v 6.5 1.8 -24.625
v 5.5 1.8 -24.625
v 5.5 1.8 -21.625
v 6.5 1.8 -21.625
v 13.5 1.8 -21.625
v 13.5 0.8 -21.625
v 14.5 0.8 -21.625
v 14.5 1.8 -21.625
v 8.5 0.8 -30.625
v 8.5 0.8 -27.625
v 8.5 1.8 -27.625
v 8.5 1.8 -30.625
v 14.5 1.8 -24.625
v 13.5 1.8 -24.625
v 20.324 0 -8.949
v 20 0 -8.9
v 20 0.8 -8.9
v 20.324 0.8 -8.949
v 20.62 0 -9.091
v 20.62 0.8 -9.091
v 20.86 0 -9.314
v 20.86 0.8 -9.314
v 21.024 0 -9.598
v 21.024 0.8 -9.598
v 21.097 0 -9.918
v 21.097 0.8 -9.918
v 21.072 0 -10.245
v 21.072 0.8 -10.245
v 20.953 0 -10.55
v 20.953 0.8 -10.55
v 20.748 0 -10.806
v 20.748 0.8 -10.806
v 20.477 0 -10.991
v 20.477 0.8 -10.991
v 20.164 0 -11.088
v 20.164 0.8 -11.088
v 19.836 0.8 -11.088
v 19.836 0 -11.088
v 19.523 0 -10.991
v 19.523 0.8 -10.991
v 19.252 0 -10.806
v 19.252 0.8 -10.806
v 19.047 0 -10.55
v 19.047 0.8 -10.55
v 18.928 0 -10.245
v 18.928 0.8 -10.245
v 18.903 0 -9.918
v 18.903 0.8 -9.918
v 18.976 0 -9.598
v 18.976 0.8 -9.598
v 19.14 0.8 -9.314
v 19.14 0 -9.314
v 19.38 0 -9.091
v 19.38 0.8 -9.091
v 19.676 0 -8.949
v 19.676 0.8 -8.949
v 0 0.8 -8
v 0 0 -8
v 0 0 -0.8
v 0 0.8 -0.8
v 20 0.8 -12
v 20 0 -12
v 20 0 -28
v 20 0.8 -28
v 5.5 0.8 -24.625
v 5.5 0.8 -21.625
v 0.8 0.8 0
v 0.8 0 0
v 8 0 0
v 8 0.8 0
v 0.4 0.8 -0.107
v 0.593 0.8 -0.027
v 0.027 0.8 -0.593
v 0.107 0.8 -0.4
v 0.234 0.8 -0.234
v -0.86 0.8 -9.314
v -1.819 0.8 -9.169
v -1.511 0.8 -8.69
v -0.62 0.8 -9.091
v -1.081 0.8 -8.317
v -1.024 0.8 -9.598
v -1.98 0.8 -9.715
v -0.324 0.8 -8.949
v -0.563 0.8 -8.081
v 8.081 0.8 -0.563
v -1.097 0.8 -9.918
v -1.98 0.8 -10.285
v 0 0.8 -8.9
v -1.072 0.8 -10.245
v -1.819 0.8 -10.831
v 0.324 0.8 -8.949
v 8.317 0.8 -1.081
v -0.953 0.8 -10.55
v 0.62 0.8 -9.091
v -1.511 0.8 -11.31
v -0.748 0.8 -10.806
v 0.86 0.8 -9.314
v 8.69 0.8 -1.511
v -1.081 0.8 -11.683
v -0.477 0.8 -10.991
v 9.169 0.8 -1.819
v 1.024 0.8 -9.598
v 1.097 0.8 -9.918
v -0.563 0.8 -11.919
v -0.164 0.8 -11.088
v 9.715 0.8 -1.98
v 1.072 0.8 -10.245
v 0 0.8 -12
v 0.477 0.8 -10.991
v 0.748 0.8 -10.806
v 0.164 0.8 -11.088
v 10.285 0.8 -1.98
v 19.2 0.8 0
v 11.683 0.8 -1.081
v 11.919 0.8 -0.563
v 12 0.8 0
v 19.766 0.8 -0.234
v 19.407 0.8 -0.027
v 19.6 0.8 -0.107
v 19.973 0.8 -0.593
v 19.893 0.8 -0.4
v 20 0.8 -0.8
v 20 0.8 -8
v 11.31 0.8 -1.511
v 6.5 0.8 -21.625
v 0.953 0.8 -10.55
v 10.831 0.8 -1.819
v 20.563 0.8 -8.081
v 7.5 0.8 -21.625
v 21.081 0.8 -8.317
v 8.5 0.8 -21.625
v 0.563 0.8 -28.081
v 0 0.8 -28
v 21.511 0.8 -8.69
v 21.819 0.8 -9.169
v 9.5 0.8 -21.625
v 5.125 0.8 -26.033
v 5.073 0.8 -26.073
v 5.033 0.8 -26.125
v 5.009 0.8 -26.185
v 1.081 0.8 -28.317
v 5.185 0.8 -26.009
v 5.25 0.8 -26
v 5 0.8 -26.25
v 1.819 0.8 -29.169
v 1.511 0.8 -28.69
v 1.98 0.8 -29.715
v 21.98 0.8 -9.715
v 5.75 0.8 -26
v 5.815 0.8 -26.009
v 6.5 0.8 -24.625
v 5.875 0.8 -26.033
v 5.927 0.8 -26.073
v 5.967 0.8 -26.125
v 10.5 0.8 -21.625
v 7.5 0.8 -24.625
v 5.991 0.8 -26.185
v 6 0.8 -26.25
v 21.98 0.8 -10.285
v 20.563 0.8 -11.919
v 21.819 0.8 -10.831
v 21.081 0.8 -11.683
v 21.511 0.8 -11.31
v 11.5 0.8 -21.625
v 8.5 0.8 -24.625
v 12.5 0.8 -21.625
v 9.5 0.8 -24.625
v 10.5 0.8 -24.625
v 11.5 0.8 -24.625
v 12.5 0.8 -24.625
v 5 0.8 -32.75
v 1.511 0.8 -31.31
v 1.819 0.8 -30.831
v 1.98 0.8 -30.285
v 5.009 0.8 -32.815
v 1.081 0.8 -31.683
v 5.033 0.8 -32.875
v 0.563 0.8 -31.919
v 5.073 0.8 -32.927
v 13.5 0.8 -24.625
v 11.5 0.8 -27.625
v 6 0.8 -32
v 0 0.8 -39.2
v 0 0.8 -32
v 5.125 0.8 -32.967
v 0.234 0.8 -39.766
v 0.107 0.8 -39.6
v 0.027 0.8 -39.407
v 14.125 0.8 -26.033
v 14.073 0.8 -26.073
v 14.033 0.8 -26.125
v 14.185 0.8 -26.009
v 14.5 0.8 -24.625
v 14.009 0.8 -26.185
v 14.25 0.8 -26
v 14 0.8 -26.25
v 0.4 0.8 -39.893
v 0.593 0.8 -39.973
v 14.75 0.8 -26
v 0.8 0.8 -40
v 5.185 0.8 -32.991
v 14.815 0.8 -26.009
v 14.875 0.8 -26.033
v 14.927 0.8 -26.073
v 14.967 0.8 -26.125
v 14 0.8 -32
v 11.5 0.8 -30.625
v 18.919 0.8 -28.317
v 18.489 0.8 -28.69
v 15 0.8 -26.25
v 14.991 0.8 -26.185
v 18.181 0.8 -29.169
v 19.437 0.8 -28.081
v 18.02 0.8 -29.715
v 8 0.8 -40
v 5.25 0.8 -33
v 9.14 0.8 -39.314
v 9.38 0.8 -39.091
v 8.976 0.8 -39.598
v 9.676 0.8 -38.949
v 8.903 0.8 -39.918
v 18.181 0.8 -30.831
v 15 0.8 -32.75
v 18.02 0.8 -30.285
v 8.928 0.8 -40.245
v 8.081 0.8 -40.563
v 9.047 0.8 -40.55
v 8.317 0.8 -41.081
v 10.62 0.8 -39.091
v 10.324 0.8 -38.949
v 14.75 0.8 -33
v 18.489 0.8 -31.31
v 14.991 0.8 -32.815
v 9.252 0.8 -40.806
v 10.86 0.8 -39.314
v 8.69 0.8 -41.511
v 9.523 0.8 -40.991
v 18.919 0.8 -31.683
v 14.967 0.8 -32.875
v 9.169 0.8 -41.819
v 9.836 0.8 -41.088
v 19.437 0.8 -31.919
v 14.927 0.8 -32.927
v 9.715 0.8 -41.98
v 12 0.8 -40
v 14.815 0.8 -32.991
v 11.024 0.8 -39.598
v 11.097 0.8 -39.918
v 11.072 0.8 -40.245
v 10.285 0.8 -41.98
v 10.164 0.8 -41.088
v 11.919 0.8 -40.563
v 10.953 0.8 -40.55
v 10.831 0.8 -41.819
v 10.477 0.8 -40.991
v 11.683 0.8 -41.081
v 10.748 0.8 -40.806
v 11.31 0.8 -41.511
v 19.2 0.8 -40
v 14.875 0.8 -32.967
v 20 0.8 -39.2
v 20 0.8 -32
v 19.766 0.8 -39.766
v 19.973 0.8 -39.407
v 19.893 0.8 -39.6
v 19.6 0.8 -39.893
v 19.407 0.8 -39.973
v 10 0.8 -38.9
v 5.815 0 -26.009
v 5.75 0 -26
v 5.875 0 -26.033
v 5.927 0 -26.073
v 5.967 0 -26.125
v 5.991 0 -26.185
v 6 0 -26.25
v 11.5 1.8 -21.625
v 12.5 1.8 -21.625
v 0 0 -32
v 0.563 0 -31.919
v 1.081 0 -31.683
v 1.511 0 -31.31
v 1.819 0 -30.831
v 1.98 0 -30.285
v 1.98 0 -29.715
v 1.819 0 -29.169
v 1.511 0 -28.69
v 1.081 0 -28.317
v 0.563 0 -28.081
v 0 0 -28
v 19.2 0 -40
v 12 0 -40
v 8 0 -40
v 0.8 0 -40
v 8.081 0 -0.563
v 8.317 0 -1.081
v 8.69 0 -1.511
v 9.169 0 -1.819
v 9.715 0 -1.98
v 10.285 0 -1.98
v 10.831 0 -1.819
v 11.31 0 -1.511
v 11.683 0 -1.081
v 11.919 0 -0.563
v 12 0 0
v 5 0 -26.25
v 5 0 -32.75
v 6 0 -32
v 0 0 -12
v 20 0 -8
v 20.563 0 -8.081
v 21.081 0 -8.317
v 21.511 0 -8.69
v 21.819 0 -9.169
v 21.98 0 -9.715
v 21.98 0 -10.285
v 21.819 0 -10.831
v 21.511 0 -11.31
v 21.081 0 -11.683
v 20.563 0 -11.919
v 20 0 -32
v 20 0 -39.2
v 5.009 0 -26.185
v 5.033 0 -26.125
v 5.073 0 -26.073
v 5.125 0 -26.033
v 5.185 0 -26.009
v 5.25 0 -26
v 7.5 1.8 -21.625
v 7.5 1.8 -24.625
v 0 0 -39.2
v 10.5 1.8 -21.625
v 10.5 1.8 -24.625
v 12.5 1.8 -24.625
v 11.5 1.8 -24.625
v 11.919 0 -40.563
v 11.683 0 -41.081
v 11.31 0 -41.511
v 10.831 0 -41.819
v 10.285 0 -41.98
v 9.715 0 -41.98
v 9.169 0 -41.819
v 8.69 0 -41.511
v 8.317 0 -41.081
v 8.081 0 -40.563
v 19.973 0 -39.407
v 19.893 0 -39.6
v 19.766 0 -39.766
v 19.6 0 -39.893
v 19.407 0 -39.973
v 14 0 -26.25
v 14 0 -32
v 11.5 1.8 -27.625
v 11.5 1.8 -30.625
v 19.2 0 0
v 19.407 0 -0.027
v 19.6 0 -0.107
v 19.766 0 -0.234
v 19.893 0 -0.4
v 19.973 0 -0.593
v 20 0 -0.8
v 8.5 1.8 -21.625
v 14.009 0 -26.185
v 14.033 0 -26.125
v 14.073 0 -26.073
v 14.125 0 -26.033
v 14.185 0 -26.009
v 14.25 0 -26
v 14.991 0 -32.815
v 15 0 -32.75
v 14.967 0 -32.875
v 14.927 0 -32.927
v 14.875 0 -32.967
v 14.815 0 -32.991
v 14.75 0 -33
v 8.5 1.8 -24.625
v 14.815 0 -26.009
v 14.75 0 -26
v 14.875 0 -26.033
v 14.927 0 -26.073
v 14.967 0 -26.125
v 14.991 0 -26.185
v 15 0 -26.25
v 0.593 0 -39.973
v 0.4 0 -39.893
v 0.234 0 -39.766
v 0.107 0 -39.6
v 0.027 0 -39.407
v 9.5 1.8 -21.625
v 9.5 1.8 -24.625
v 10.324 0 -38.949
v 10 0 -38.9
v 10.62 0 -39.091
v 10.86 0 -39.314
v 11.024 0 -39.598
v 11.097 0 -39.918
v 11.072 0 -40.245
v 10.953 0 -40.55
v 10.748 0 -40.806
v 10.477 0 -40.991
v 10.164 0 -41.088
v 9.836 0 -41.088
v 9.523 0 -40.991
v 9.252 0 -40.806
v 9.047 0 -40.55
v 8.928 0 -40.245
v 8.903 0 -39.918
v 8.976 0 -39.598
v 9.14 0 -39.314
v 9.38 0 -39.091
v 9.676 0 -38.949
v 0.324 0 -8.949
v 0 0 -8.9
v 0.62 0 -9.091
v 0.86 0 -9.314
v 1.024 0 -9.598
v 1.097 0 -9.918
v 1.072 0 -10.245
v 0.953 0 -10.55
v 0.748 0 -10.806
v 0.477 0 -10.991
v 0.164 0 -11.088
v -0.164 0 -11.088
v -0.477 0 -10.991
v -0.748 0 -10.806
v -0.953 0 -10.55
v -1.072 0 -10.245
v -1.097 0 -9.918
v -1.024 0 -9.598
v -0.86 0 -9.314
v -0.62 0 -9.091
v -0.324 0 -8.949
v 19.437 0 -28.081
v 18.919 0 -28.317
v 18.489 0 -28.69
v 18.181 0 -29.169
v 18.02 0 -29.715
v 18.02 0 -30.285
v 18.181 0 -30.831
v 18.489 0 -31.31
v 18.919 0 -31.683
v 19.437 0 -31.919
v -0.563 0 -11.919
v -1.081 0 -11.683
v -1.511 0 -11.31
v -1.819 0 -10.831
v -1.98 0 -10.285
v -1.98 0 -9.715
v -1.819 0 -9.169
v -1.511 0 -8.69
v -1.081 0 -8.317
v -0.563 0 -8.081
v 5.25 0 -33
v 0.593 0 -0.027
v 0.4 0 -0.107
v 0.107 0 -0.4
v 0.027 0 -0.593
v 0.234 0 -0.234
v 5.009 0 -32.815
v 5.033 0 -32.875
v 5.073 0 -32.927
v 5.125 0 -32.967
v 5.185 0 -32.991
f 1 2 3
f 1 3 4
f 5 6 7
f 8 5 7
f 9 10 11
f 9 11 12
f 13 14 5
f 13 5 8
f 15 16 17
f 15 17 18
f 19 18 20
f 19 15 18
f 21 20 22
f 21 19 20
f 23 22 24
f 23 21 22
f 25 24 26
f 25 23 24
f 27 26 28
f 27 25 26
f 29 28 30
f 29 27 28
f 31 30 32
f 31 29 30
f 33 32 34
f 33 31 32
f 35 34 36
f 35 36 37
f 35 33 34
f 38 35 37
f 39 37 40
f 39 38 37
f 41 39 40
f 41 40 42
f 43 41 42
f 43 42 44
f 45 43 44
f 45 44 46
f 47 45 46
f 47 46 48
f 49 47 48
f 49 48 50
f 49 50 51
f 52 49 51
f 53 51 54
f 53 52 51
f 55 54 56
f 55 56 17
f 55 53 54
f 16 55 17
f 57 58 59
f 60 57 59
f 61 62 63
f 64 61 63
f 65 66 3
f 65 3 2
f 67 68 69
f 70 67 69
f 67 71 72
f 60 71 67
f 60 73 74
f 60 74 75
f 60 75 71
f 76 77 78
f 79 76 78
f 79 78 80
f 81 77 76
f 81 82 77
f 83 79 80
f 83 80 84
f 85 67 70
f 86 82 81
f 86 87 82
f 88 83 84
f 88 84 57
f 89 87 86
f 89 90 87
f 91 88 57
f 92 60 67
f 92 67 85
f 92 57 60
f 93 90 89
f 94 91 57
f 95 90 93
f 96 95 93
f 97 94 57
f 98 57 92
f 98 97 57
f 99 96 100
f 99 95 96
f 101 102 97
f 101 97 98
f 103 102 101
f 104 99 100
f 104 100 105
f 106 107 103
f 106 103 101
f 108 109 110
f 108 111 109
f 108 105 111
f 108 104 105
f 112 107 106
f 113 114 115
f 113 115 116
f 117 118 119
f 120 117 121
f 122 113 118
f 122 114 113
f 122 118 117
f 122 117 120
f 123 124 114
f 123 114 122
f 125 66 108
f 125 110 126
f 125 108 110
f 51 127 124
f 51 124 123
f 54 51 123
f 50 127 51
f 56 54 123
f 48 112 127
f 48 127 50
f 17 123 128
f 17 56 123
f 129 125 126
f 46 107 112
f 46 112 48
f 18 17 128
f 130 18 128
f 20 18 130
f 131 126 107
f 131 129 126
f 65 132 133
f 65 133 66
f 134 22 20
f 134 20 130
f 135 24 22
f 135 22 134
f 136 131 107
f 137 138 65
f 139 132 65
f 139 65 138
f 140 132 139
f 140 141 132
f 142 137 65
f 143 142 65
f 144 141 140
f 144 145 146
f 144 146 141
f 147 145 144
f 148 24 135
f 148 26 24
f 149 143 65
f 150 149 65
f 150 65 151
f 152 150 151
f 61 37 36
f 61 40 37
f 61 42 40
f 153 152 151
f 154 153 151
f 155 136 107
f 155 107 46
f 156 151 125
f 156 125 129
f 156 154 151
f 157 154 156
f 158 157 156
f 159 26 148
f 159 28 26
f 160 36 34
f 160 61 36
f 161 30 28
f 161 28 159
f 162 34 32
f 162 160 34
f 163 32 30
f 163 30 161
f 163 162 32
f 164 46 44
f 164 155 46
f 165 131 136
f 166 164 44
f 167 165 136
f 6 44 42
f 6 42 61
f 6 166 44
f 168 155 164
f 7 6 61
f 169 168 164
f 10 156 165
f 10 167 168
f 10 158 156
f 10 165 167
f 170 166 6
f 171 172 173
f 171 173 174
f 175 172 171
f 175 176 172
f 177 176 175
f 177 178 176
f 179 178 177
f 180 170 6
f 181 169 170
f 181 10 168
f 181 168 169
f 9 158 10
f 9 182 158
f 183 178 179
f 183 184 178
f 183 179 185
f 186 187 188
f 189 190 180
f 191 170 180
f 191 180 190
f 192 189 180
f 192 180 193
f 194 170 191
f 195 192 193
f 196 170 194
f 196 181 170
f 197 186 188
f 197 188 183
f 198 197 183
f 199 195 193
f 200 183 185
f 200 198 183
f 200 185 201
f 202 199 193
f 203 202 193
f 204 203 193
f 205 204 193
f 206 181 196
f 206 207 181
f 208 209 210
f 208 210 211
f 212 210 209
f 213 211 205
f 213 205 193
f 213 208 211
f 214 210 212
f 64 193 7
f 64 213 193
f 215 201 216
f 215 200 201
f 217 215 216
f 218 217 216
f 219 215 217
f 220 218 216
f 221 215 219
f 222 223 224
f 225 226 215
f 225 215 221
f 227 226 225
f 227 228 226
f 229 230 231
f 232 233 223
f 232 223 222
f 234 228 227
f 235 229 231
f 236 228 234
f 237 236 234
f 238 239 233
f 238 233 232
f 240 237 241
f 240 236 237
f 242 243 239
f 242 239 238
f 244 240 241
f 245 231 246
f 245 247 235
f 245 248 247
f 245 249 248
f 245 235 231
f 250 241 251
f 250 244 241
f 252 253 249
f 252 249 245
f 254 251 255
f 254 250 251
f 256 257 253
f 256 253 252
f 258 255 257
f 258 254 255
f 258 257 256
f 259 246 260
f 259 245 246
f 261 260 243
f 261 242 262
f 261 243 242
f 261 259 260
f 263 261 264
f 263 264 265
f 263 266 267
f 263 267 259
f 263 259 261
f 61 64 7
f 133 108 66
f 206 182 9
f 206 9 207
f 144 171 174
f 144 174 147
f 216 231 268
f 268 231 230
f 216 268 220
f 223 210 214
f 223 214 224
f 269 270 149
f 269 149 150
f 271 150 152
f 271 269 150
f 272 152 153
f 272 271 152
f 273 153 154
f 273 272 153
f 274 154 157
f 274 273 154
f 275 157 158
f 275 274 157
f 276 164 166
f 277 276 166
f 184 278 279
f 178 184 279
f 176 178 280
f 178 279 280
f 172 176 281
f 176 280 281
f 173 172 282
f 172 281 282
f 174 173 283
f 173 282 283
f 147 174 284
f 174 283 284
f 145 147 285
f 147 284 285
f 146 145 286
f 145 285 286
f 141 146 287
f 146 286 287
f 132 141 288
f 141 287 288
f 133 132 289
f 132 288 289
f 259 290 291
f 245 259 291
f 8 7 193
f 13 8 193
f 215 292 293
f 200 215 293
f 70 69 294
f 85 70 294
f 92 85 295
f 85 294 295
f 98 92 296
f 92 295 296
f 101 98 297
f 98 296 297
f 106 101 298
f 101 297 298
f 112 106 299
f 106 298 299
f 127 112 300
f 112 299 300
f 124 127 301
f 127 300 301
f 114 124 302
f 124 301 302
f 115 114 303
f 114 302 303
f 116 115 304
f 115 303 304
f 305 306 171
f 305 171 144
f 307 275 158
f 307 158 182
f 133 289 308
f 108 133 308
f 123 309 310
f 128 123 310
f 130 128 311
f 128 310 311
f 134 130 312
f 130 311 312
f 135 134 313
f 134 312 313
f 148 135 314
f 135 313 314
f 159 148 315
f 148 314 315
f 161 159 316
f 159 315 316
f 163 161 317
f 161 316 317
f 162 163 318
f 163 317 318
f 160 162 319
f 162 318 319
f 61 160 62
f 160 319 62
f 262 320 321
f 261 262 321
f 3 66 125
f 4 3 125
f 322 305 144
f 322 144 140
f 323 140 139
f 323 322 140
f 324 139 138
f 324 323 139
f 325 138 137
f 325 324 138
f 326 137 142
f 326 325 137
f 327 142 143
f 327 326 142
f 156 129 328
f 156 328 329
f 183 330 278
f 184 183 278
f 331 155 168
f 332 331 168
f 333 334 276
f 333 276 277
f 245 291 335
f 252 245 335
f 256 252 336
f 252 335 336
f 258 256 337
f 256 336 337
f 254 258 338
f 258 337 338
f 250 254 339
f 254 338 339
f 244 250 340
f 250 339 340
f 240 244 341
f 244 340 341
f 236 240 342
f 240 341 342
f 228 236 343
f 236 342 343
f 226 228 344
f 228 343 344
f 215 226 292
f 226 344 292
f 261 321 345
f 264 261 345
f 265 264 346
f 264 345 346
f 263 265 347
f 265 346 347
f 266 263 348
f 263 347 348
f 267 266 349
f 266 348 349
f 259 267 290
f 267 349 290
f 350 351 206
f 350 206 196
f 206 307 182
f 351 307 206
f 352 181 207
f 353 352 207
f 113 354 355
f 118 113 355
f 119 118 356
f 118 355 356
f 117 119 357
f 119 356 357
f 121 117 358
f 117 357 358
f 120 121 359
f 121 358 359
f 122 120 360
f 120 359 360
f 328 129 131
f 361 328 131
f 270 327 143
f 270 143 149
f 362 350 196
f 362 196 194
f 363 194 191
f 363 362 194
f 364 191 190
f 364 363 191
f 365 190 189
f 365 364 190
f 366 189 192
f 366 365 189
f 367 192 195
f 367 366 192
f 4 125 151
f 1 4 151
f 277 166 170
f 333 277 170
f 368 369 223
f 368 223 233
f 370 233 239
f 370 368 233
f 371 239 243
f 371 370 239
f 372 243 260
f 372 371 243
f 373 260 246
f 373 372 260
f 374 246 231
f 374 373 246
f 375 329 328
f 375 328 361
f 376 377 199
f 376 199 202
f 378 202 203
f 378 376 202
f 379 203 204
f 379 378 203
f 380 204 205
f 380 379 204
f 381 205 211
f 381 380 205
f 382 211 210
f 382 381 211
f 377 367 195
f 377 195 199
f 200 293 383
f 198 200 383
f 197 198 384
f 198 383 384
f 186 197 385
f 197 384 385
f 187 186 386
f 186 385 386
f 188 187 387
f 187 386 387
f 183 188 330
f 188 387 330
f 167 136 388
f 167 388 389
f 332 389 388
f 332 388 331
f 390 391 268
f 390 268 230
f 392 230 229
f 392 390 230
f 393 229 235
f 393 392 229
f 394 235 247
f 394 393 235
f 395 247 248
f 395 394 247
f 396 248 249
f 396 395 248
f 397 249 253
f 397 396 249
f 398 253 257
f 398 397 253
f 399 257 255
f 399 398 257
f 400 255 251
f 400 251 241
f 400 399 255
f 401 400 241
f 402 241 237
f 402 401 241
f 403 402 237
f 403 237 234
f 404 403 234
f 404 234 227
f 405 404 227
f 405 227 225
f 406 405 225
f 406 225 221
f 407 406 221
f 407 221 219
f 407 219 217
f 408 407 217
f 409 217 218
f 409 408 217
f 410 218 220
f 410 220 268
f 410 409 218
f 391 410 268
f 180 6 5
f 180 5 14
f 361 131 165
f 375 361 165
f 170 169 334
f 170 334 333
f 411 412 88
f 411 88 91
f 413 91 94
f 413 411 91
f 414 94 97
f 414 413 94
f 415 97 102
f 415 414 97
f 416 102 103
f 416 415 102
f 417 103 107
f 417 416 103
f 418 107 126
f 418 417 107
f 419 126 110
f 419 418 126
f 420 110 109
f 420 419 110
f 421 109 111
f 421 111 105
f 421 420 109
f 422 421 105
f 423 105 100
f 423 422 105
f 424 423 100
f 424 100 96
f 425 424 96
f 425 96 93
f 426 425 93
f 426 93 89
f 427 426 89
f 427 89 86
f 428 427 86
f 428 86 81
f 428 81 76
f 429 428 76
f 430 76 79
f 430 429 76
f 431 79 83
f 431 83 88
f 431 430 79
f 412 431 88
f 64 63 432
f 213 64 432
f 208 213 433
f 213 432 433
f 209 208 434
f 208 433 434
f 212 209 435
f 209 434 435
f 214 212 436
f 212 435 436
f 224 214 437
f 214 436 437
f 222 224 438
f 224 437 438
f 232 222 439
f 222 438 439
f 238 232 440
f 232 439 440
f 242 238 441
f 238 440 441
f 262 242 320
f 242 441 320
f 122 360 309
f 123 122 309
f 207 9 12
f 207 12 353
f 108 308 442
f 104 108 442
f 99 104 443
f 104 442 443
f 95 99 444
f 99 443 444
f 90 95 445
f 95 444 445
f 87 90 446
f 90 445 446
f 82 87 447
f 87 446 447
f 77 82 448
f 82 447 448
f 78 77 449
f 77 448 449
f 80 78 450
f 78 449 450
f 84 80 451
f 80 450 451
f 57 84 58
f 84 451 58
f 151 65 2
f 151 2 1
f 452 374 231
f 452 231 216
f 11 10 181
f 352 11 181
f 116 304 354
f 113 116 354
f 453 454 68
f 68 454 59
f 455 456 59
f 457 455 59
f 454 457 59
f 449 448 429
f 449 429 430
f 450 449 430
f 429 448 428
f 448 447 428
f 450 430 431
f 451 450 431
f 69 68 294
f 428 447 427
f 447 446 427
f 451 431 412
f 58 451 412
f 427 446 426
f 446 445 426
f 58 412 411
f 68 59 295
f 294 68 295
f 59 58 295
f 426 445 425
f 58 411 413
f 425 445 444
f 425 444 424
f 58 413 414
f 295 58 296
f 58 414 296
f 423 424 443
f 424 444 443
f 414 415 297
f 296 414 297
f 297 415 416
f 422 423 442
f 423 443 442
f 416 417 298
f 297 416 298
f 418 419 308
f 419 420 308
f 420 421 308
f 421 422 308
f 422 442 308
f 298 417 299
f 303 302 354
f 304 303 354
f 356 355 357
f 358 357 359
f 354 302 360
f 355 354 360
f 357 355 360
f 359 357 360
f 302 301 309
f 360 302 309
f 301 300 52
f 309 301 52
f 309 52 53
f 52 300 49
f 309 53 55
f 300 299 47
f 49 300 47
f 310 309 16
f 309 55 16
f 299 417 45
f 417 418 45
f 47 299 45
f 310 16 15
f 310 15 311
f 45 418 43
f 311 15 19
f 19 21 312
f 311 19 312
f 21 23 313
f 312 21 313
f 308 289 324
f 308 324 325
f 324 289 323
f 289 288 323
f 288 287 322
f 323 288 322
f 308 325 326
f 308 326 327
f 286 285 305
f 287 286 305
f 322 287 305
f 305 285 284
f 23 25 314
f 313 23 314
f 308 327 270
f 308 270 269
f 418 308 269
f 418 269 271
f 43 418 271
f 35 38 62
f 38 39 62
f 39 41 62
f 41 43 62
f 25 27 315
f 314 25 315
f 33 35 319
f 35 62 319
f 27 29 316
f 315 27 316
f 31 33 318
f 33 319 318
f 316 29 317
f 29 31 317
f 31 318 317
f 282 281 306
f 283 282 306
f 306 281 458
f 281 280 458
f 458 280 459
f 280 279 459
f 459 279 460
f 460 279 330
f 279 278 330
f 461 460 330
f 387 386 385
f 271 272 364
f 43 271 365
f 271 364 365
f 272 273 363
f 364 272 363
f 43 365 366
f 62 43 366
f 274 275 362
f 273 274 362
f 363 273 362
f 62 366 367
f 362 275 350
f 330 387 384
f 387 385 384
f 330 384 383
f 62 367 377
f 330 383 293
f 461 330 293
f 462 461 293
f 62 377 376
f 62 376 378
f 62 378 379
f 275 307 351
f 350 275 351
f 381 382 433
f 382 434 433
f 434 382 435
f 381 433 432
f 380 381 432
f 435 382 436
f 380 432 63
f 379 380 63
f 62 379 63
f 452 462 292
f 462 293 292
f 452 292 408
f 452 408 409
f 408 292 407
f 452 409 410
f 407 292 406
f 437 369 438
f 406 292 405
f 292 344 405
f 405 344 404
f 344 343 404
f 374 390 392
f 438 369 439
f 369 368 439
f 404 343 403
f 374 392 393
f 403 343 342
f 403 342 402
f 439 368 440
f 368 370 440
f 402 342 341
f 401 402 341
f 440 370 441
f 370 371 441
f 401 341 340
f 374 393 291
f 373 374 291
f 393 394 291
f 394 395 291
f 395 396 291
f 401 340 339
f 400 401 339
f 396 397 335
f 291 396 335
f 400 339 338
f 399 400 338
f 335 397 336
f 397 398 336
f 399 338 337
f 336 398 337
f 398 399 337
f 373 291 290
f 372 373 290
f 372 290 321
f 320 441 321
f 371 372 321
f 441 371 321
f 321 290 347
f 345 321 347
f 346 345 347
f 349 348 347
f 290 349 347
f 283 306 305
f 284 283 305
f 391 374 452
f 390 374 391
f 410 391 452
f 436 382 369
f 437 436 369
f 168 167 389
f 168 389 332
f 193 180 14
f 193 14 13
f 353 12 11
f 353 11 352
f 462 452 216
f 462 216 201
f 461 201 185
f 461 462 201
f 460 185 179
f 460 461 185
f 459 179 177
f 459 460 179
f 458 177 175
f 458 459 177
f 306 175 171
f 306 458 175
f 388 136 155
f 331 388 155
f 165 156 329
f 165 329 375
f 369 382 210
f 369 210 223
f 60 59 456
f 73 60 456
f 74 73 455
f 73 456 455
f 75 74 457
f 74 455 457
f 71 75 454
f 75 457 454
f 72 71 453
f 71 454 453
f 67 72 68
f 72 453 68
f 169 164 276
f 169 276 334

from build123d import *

# Parameters (mm, degrees)
SKETCH1_R        = 1.1
BOARD_DEPTH      = 0.8
U_CUT_DEPTH      = 48.419827077
U_CUT_DEPTH_BACK = 48.419827077
SKETCH3_W        = 1
SKETCH3_H        = 3
SKETCH3_W_2      = 3
SMDS_DEPTH       = 1


with BuildPart() as part:
    # Sketch1 → Board (new body)
    with BuildSketch(Plane(origin=(0, 0, 0), x_dir=(1, 0, 0), z_dir=(0, 1, 0))):
        with BuildLine():
            Line((0.8, 0), (8, 0))
            ThreePointArc((8, 0), (10, 2), (12, 0))
            Line((12, 0), (19.2, 0))
            ThreePointArc((19.2, 0), (19.765685425, 0.234314575), (20, 0.8))
            Line((20, 0.8), (20, 8))
            ThreePointArc((20, 8), (22, 10), (20, 12))
            Line((20, 12), (20, 28))
            ThreePointArc((20, 28), (18, 30), (20, 32))
            Line((20, 32), (20, 39.2))
            ThreePointArc((20, 39.2), (19.765685425, 39.765685425), (19.2, 40))
            Line((19.2, 40), (12, 40))
            ThreePointArc((12, 40), (10, 42), (8, 40))
            Line((8, 40), (0.8, 40))
            ThreePointArc((0.8, 40), (0.234314575, 39.765685425), (0, 39.2))
            Line((0, 39.2), (0, 32))
            ThreePointArc((0, 32), (2, 30), (0, 28))
            Line((0, 28), (0, 12))
            ThreePointArc((0, 12), (-2, 10), (0, 8))
            Line((0, 8), (0, 0.8))
            ThreePointArc((0, 0.8), (0.234314575, 0.234314575), (0.8, 0))
        make_face()
        with Locations(Location((10, 40, 0), (0, 0, 270))):
            Circle(SKETCH1_R, mode=Mode.SUBTRACT)
        with Locations(Location((0, 10, 0), (0, 0, 270))):
            Circle(SKETCH1_R, mode=Mode.SUBTRACT)
        with Locations(Location((20, 10, 0), (0, 0, 270))):
            Circle(SKETCH1_R, mode=Mode.SUBTRACT)
    extrude(amount=BOARD_DEPTH)

    # Sketch2 → U-cut (cut, two sides: drawn at the far end of the back side and taken through both)
    with BuildSketch(Plane(origin=(0, 0.8, 0), x_dir=(1, 0, 0), z_dir=(0, 1, 0)).offset(-U_CUT_DEPTH_BACK)):
        with BuildLine():
            Line((14.25, 26), (14.75, 26))
            ThreePointArc((14.75, 26), (14.926776695, 26.073223305), (15, 26.25))
            Line((15, 26.25), (15, 32.75))
            ThreePointArc((15, 32.75), (14.926776695, 32.926776695), (14.75, 33))
            Line((14.75, 33), (5.25, 33))
            ThreePointArc((5.25, 33), (5.073223305, 32.926776695), (5, 32.75))
            Line((5, 32.75), (5, 26.25))
            ThreePointArc((5, 26.25), (5.073223305, 26.073223305), (5.25, 26))
            Line((5.25, 26), (5.75, 26))
            ThreePointArc((5.75, 26), (5.926776695, 26.073223305), (6, 26.25))
            Line((6, 26.25), (6, 32))
            Line((6, 32), (14, 32))
            Line((14, 32), (14, 26.25))
            ThreePointArc((14, 26.25), (14.073223305, 26.073223305), (14.25, 26))
        make_face()
    extrude(amount=U_CUT_DEPTH + U_CUT_DEPTH_BACK, mode=Mode.SUBTRACT)

    # Sketch3 → SMDs (add)
    with BuildSketch(Plane(origin=(0, 0.8, 0), x_dir=(1, 0, 0), z_dir=(0, 1, 0))):
        with Locations((6, 23.125)):
            Rectangle(SKETCH3_W, SKETCH3_H)
        with Locations((8, 23.125)):
            Rectangle(SKETCH3_W, SKETCH3_H)
        with Locations((10, 23.125)):
            Rectangle(SKETCH3_W, SKETCH3_H)
        with Locations((12, 23.125)):
            Rectangle(SKETCH3_W, SKETCH3_H)
        with Locations((14, 23.125)):
            Rectangle(SKETCH3_W, SKETCH3_H)
        with Locations((10, 29.125)):
            Rectangle(SKETCH3_W_2, SKETCH3_H)
    extrude(amount=SMDS_DEPTH)


solid = part.part
